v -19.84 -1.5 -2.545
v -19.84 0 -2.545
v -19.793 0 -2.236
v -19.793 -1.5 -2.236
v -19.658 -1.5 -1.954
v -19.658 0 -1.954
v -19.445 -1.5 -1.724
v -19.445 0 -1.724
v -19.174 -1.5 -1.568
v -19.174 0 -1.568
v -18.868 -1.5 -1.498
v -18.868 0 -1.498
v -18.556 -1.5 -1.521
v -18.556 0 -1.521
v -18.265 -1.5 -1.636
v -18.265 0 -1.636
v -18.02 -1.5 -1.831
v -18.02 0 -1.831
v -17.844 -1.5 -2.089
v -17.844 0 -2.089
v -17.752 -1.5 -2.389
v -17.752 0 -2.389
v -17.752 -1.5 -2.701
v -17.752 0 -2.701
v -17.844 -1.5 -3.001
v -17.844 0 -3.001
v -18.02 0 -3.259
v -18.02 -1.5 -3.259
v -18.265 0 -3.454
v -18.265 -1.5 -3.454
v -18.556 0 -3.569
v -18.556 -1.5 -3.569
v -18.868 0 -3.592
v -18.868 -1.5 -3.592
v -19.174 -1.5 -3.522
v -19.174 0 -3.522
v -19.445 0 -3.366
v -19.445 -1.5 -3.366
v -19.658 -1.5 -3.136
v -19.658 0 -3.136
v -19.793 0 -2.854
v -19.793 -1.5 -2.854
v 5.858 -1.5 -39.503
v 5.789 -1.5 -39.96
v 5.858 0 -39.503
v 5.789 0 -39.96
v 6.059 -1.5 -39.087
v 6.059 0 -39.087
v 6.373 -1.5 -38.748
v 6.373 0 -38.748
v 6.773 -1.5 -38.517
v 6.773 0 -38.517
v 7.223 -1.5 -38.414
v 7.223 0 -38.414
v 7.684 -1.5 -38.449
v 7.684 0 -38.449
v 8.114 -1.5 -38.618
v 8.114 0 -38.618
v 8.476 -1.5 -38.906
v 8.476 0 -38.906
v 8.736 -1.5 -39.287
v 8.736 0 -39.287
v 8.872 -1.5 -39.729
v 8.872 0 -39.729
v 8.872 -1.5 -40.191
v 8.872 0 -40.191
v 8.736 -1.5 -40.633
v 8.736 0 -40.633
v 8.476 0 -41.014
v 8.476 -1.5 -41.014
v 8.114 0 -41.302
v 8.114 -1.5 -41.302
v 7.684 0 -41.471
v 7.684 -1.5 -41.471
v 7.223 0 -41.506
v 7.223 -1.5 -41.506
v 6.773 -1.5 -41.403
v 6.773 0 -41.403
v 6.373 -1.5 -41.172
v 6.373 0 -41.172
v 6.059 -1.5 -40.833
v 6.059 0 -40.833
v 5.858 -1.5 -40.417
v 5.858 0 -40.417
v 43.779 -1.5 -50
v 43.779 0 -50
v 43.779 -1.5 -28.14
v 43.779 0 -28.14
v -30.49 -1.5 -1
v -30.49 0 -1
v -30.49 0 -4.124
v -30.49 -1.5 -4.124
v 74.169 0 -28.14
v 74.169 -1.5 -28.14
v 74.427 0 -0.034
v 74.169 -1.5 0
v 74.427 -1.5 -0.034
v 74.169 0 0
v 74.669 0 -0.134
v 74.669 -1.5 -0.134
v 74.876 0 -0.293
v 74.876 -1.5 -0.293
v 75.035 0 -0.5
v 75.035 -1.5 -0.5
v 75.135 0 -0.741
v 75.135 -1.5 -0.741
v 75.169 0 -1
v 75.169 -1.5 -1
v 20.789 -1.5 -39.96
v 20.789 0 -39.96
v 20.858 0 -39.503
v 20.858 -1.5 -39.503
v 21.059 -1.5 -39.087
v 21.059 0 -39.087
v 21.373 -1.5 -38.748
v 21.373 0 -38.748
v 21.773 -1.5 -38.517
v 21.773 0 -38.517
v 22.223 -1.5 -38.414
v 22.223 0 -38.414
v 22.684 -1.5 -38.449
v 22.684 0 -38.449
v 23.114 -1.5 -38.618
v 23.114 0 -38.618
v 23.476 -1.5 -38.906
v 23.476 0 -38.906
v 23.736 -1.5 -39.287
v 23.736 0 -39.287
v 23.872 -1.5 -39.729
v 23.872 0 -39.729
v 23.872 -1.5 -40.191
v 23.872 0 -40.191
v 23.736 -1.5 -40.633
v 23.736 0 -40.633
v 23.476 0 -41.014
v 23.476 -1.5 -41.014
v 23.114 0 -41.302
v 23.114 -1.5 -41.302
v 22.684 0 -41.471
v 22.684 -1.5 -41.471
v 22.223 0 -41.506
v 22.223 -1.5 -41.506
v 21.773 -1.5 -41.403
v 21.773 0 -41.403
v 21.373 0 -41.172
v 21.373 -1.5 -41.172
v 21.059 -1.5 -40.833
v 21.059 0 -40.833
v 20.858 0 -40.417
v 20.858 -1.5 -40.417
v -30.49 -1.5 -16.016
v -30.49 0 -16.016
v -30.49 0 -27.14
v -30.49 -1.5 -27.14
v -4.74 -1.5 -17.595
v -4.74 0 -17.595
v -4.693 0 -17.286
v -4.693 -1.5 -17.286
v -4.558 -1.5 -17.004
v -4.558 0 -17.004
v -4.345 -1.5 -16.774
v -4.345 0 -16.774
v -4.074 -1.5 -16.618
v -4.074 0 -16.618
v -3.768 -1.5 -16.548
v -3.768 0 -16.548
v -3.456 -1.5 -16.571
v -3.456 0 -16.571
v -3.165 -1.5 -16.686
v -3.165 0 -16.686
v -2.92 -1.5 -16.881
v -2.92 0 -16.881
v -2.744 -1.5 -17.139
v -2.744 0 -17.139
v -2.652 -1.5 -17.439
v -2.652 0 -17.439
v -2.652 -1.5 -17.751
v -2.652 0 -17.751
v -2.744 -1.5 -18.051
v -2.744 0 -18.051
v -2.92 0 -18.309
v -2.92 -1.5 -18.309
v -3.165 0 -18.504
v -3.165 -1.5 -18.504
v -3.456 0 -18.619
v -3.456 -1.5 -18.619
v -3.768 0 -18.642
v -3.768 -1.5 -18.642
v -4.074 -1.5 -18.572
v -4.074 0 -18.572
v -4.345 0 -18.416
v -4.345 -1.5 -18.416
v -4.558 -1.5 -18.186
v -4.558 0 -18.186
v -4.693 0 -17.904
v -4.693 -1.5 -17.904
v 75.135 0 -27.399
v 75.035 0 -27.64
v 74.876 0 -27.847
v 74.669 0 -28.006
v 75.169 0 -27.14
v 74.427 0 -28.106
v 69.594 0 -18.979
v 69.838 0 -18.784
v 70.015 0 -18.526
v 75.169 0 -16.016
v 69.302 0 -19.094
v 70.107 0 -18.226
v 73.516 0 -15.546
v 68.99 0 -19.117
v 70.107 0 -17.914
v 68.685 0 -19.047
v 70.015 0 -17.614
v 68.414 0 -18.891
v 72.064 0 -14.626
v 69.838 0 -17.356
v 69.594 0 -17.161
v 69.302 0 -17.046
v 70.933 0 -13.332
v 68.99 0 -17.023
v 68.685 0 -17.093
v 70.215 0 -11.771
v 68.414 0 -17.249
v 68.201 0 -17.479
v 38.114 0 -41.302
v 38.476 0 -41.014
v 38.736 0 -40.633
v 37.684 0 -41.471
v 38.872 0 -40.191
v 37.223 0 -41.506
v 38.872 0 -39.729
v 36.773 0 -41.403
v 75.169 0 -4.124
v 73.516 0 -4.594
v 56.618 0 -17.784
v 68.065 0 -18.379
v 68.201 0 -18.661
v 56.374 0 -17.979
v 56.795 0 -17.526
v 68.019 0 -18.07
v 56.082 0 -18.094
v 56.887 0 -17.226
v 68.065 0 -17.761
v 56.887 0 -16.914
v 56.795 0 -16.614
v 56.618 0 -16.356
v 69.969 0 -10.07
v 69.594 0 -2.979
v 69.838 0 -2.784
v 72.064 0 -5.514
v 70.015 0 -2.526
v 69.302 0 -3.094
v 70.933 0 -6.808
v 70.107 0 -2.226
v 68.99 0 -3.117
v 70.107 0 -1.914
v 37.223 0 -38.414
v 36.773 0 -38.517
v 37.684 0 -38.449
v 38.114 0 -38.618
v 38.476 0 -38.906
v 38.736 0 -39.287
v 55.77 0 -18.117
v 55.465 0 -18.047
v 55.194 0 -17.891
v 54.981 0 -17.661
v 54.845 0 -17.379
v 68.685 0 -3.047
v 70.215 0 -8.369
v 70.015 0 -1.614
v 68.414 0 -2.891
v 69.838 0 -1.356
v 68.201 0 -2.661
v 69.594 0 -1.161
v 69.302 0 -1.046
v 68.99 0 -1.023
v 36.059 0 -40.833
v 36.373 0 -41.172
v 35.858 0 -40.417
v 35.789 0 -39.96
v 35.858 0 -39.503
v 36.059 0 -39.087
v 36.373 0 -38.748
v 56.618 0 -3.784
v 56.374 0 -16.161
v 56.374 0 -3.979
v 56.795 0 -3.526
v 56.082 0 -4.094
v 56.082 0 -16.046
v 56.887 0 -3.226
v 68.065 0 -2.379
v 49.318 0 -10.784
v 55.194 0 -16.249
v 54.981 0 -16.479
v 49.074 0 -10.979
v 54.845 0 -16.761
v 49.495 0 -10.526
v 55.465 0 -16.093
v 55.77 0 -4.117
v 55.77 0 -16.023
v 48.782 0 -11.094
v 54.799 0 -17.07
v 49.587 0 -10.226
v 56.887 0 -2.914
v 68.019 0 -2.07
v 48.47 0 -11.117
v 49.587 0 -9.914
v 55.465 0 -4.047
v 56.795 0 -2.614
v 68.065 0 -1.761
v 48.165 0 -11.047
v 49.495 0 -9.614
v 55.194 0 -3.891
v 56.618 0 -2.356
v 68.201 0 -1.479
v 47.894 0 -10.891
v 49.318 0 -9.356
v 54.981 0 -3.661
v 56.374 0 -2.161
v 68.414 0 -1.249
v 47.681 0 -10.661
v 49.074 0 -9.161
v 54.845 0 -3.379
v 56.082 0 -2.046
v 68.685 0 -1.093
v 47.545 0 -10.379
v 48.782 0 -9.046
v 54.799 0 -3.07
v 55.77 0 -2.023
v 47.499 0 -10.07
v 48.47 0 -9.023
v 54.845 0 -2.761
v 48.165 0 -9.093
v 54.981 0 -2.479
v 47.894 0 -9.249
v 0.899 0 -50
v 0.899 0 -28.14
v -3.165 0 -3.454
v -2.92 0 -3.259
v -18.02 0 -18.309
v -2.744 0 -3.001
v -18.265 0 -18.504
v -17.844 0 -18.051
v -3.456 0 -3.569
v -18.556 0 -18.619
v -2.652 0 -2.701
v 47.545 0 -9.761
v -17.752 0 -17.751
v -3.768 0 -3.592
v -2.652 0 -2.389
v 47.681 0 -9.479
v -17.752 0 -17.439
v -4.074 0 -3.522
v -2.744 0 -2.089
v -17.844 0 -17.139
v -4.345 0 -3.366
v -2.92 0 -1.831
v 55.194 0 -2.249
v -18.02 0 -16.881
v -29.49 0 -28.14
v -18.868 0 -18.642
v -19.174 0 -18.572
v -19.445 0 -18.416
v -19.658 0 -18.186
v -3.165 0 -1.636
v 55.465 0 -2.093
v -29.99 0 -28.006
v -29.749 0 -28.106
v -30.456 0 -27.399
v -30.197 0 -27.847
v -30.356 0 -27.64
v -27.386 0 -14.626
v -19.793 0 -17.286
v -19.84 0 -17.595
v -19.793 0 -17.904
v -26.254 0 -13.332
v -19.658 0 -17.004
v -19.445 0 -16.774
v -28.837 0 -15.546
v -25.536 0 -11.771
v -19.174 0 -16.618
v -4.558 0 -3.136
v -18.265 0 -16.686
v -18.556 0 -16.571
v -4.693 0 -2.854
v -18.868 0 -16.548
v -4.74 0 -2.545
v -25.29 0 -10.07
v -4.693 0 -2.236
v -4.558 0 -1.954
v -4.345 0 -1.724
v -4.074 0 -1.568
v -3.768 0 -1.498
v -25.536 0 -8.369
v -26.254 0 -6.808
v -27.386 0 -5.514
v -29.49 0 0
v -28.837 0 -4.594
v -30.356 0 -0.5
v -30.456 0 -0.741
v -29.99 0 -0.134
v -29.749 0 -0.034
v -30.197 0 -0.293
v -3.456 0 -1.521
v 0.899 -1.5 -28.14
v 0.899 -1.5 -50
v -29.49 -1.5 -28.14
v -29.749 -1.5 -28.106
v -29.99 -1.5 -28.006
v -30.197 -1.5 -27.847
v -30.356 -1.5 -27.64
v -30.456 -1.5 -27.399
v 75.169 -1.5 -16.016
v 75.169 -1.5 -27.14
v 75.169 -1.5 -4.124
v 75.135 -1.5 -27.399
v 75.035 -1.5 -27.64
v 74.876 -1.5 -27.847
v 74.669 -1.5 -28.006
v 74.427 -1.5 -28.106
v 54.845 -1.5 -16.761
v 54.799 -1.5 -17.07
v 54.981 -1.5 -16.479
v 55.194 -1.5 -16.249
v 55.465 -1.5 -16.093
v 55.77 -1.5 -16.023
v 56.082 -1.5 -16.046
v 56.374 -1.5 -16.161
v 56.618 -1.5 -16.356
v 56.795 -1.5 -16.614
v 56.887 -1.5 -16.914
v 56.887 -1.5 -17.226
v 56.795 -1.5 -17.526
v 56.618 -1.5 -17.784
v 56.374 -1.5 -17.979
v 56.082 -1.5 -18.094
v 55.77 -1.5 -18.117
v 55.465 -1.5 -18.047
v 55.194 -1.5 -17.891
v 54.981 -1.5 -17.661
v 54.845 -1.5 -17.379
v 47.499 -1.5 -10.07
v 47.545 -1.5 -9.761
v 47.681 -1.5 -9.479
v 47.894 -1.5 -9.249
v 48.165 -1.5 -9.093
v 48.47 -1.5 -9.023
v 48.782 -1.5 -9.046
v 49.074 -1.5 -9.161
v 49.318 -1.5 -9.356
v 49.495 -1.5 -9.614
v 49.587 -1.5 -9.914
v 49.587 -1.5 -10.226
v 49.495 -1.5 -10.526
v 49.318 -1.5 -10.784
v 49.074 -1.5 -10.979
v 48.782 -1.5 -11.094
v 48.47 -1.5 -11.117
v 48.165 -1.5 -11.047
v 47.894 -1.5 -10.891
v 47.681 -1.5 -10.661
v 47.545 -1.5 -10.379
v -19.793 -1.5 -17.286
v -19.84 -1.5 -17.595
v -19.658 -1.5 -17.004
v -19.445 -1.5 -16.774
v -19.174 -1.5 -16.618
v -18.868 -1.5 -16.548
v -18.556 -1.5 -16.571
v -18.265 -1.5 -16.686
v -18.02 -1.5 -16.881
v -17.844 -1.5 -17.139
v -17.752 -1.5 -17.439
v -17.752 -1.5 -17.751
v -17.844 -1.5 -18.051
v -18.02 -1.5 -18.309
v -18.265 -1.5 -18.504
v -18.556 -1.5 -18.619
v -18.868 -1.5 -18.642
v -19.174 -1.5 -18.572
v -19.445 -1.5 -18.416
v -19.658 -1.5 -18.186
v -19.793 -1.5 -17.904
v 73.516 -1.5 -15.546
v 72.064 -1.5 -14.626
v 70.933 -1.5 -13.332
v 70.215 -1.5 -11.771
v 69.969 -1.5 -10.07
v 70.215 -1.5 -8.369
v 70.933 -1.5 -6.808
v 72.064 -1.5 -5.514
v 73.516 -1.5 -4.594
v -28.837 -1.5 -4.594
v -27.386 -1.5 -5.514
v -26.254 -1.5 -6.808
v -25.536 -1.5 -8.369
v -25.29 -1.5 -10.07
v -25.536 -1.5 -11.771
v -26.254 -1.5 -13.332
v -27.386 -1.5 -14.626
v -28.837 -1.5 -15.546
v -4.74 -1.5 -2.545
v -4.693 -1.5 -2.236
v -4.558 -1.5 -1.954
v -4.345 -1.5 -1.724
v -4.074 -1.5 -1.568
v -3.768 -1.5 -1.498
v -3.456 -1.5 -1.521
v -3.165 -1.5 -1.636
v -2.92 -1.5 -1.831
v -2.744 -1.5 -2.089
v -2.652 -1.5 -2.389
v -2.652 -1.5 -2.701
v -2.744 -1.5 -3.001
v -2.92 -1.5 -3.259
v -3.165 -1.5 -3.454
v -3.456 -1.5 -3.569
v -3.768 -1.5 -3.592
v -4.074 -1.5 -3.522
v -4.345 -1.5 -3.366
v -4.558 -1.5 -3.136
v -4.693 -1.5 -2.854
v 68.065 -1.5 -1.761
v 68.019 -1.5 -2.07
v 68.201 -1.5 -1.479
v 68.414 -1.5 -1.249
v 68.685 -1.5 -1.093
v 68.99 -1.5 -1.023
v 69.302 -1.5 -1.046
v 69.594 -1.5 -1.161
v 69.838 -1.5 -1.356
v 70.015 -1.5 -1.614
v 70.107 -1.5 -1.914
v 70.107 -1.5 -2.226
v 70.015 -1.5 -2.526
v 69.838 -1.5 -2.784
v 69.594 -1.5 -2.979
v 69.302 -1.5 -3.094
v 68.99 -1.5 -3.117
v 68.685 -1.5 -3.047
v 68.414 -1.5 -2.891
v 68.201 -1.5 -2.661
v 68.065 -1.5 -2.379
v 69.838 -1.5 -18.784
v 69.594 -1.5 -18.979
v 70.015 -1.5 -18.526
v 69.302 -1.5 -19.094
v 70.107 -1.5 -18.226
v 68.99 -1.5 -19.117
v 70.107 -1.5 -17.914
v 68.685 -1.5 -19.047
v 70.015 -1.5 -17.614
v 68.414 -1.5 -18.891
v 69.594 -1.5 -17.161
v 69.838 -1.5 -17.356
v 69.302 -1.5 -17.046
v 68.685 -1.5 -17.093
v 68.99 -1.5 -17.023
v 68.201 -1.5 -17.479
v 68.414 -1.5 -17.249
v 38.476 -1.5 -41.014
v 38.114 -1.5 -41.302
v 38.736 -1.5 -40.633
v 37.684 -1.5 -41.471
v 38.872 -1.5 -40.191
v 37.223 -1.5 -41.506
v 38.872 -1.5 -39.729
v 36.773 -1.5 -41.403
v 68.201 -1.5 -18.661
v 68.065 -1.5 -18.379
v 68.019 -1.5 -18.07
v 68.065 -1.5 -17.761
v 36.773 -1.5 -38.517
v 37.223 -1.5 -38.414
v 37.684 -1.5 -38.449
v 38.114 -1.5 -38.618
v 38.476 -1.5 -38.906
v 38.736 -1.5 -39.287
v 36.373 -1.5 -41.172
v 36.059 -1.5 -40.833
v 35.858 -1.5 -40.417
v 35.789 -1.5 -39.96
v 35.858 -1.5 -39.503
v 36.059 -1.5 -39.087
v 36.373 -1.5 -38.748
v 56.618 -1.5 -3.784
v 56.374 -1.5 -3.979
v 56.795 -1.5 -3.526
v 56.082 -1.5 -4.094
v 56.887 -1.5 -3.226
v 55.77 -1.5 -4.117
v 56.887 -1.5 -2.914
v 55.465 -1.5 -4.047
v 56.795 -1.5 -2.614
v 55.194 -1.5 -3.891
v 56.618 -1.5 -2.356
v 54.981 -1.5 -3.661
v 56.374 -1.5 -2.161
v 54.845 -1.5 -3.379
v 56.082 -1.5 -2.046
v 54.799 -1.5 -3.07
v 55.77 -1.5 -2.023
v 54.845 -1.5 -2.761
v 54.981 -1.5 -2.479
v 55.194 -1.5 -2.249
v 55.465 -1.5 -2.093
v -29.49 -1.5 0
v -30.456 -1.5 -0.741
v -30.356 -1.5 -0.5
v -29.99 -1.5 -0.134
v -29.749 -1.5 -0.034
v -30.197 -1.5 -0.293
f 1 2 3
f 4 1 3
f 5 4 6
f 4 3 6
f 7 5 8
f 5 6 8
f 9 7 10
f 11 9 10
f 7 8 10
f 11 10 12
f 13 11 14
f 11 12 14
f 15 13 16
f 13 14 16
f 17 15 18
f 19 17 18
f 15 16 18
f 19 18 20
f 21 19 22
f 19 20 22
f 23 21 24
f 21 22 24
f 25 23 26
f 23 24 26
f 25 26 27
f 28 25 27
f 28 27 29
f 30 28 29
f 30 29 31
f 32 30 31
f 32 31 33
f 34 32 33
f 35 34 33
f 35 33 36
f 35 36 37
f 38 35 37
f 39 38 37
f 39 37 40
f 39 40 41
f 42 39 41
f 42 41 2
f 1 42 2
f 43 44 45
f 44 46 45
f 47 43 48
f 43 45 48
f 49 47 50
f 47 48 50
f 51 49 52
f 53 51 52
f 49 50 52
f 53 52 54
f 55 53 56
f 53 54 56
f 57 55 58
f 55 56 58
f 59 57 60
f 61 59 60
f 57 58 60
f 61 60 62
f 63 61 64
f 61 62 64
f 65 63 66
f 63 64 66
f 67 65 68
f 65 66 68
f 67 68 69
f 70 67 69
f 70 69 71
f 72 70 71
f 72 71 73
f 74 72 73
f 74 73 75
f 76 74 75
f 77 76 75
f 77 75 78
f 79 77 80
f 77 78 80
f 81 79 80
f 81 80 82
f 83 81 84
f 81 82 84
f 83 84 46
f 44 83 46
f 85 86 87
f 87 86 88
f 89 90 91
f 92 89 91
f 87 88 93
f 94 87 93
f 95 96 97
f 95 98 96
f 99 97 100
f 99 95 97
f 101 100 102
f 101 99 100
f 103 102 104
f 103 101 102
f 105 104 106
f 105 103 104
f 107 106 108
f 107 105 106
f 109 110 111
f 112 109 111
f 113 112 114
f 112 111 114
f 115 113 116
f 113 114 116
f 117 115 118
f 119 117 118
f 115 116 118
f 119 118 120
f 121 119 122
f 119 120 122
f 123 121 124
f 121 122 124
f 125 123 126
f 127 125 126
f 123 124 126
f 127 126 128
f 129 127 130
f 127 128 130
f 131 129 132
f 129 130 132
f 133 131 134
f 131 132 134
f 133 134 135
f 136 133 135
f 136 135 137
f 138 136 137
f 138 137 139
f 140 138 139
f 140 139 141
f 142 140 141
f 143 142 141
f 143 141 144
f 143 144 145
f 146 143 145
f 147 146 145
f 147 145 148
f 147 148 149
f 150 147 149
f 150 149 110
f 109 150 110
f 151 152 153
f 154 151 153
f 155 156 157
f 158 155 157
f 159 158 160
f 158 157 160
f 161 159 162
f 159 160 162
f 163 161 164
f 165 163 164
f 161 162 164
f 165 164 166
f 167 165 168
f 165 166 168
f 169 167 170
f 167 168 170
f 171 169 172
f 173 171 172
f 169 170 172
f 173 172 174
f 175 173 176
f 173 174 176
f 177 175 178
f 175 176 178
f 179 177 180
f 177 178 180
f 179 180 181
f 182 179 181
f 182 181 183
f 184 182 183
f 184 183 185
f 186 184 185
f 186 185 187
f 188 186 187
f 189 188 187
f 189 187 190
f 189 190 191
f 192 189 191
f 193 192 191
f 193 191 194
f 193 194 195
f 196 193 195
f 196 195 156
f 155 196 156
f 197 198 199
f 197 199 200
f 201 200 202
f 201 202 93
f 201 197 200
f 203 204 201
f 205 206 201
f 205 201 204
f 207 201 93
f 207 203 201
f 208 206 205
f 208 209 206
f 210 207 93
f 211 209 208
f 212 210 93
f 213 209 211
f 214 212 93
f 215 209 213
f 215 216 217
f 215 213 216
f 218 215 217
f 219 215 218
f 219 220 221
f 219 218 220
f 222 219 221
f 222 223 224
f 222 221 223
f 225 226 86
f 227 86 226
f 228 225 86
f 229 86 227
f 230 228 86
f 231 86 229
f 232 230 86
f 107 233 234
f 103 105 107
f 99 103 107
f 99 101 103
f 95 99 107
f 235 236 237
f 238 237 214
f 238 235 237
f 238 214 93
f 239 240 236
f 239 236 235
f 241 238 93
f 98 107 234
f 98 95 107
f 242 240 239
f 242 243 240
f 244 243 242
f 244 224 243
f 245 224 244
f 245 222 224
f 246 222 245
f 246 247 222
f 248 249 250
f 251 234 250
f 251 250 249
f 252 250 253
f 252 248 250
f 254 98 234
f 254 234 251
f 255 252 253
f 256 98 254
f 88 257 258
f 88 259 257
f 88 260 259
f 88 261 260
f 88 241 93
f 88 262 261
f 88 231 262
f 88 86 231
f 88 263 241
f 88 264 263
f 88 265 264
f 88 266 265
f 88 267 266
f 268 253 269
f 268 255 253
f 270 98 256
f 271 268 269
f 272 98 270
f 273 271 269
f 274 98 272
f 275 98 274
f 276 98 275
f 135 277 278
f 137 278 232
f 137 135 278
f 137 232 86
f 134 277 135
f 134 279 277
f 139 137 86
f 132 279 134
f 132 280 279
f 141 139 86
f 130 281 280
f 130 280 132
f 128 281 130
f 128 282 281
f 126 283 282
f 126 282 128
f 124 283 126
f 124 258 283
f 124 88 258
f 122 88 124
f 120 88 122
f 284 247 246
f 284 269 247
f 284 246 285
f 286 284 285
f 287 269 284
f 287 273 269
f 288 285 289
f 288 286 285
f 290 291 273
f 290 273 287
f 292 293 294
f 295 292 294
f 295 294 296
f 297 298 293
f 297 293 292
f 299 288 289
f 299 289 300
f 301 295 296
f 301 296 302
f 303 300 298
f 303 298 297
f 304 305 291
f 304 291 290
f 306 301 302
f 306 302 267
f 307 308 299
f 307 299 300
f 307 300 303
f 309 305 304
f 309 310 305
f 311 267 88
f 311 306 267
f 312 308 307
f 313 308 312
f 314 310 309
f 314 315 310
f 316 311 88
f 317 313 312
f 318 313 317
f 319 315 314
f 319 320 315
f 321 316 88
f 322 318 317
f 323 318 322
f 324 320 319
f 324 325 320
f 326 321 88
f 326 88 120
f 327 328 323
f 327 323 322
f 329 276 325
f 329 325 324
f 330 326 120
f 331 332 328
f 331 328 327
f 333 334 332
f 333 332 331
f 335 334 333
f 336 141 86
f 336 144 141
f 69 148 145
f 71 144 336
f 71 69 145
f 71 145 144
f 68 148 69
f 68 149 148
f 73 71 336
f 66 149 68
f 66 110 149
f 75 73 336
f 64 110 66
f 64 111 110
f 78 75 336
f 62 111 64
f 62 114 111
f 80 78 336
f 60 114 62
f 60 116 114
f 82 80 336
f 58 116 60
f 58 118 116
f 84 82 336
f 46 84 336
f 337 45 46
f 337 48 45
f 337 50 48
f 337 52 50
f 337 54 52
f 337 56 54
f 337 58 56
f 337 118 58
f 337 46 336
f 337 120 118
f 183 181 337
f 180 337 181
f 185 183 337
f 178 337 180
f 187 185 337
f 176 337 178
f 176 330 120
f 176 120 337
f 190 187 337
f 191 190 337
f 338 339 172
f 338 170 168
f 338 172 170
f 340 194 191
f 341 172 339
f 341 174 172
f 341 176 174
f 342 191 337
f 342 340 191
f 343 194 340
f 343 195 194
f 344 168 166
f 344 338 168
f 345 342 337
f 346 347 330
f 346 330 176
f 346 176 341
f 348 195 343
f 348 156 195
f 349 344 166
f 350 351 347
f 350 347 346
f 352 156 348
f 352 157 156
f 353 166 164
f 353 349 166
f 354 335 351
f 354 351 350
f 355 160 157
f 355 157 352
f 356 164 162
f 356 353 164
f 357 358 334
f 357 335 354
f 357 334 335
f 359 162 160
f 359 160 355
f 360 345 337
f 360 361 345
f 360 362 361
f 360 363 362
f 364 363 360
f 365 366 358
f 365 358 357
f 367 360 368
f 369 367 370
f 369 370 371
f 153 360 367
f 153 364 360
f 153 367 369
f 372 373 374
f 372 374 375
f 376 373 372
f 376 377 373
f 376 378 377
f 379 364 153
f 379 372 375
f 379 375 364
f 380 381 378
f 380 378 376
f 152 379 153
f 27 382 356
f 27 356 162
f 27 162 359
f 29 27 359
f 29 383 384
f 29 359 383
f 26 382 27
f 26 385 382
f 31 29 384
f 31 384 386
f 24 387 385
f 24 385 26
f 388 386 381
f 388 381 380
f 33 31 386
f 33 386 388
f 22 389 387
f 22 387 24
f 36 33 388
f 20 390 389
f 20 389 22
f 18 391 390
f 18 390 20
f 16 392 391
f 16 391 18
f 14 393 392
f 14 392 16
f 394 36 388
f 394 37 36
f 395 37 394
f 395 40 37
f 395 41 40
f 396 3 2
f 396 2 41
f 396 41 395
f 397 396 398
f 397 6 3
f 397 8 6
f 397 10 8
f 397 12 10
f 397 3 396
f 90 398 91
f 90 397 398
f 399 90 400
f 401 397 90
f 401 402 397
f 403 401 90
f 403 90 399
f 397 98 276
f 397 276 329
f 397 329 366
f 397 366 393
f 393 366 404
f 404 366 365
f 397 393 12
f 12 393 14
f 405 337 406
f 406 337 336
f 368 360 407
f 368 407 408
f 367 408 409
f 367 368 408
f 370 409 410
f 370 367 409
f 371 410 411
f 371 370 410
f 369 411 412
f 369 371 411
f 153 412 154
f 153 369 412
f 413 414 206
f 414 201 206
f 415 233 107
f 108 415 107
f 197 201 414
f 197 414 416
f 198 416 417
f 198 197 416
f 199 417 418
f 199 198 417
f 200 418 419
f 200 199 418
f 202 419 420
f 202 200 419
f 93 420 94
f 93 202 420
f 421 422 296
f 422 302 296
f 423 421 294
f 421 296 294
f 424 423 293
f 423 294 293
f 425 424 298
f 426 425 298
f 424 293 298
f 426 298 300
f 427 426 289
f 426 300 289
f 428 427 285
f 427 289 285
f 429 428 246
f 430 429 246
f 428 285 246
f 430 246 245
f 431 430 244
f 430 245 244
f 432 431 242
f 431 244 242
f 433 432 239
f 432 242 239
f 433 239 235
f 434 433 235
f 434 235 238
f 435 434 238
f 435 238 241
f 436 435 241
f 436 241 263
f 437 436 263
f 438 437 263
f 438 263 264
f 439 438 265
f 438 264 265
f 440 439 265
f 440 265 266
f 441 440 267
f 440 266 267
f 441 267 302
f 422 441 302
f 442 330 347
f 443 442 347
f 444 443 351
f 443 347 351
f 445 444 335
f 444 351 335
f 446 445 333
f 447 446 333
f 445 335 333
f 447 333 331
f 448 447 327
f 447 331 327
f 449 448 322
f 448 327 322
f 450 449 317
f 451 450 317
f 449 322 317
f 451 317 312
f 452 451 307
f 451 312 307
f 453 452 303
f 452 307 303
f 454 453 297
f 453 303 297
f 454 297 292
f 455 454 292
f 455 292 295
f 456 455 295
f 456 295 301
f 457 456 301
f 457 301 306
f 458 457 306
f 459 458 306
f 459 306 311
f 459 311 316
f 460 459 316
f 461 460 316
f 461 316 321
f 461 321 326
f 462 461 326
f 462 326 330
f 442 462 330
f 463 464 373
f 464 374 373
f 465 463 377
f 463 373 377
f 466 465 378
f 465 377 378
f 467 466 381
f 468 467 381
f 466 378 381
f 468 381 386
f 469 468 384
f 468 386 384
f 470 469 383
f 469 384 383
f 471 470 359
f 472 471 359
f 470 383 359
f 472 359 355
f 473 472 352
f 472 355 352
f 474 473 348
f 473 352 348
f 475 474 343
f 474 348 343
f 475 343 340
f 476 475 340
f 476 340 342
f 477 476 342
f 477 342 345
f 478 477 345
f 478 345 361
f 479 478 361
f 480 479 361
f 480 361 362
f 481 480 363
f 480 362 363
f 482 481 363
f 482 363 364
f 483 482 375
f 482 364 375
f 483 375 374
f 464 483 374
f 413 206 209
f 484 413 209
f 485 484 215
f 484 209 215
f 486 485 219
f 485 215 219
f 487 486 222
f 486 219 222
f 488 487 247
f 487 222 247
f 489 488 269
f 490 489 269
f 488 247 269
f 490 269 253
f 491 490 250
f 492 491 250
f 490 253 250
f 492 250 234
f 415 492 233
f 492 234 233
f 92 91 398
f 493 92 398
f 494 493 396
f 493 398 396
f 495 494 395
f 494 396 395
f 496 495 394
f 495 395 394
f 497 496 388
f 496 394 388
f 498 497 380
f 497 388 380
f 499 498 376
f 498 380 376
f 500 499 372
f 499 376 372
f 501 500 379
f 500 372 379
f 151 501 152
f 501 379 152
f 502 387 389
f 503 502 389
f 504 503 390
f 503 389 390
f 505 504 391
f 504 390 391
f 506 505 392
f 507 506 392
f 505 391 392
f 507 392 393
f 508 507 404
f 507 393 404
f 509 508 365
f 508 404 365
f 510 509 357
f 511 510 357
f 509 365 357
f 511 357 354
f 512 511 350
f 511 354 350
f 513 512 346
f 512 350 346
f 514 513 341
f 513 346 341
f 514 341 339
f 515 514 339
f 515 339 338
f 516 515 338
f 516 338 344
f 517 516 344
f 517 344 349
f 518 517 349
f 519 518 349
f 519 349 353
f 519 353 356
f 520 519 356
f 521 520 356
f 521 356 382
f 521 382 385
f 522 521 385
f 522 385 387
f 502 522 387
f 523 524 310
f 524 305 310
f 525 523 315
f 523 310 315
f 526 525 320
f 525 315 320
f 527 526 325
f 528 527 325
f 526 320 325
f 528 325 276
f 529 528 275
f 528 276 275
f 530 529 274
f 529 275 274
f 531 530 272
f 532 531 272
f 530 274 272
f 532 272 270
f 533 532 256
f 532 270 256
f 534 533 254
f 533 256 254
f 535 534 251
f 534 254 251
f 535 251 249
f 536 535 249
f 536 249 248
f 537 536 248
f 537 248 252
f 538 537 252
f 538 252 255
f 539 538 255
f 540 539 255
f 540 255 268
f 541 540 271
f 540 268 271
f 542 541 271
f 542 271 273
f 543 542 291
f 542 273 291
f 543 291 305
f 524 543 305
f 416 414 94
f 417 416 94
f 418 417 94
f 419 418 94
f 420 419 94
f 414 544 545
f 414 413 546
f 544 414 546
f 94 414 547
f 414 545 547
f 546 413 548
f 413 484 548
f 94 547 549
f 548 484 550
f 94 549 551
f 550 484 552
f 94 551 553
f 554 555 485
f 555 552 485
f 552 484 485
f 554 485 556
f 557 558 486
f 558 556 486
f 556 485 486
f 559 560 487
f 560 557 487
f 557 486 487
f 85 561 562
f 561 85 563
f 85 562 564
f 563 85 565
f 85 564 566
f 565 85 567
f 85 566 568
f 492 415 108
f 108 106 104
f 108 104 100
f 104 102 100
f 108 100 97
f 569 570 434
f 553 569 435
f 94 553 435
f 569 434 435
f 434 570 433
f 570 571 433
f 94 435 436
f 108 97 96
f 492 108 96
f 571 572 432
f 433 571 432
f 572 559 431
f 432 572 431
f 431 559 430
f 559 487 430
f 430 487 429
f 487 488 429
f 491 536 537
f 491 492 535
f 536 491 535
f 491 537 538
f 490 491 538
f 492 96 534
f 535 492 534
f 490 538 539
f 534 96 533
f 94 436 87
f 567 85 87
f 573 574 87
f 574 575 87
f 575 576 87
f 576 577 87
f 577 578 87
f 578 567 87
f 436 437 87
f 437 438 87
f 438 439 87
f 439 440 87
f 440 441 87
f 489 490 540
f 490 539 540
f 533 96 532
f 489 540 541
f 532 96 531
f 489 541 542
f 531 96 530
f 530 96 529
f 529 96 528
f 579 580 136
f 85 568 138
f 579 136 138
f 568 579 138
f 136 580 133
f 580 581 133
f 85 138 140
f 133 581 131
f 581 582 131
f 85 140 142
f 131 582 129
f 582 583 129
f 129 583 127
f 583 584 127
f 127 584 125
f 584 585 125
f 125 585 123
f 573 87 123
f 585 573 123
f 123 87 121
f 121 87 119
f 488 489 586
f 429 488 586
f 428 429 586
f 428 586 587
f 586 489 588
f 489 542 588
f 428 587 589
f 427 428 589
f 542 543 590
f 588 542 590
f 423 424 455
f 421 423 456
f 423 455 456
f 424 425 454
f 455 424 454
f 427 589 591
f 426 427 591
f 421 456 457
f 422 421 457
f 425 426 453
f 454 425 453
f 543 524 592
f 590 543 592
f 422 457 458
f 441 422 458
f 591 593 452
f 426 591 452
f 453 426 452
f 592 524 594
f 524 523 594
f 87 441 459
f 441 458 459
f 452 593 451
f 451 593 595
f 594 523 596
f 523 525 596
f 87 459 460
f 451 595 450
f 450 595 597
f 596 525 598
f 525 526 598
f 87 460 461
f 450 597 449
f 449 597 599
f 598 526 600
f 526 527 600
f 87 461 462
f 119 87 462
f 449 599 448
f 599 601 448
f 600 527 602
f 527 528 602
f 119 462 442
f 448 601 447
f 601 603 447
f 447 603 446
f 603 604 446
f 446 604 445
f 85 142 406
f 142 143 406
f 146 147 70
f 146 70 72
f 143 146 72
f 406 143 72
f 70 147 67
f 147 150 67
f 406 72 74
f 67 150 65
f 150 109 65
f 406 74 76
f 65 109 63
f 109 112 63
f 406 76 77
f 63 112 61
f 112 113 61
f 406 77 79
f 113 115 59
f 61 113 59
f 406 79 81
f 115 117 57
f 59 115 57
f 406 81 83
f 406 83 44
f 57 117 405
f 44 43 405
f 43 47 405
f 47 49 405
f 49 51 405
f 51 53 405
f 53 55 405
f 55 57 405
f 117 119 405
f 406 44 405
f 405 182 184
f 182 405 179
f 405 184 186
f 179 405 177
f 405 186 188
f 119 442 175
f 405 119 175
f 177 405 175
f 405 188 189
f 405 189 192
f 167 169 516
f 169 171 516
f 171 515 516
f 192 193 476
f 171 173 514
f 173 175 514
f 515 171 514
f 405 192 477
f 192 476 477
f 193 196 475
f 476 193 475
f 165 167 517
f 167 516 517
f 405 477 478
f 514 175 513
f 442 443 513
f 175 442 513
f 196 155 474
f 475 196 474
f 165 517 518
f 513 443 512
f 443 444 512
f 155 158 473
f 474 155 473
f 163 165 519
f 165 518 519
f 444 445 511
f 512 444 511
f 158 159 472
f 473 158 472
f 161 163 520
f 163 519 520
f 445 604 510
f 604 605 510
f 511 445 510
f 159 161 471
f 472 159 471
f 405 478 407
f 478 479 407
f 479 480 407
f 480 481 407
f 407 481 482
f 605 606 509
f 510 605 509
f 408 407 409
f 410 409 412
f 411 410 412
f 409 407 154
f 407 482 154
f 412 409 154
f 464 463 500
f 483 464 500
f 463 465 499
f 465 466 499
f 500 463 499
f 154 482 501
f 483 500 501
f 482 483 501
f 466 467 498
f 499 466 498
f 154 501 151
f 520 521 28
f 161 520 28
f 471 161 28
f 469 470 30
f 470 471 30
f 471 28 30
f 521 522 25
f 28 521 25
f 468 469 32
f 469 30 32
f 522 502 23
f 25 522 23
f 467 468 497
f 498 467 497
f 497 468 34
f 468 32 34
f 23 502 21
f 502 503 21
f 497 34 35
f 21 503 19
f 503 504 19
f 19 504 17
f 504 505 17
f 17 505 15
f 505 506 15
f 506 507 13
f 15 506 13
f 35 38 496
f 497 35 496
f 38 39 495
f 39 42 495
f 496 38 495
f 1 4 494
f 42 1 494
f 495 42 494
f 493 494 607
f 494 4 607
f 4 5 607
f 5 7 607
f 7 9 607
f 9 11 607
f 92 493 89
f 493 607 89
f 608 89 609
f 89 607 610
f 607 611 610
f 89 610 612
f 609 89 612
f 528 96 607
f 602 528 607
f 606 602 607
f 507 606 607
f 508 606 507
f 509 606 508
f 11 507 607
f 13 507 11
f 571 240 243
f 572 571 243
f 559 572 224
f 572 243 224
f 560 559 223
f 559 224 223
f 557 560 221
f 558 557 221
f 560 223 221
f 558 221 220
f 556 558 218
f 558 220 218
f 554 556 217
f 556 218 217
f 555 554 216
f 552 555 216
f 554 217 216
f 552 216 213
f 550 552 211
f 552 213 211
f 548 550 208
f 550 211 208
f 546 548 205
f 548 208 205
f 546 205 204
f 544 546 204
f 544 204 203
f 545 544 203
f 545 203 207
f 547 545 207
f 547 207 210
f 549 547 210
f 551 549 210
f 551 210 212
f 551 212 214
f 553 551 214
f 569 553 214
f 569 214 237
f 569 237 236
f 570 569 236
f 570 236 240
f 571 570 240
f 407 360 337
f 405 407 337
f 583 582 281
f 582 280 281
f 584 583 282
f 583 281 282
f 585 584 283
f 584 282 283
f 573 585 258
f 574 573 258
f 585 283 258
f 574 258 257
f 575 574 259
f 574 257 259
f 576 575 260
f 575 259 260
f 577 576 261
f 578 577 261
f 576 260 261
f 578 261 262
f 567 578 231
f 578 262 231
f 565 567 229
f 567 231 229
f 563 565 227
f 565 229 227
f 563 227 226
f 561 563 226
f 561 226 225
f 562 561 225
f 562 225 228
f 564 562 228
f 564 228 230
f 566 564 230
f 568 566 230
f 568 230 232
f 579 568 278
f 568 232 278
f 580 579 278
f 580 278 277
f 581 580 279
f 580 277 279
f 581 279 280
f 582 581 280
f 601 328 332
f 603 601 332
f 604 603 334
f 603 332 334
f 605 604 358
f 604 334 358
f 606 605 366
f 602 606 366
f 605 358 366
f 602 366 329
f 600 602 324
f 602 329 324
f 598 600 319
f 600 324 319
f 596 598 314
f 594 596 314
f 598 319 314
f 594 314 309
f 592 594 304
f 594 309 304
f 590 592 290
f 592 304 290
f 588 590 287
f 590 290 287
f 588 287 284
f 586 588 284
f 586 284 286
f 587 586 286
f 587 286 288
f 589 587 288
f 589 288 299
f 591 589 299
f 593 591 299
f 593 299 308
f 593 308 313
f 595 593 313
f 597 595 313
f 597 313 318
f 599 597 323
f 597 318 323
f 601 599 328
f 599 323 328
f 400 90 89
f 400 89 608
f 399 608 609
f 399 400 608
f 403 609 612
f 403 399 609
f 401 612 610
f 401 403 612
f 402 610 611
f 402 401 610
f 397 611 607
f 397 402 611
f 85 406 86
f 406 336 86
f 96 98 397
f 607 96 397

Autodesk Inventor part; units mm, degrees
ref_plane "YZ Plane" through (0, 0, 0) normal (1, 0, 0) x (0, 1, 0)
ref_plane "XZ Plane" through (0, 0, 0) normal (0, 1, 0) x (-1, 0, 0)
ref_plane "XY Plane" through (0, 0, 0) normal (0, 0, 1) x (1, 0, 0)
sketch "Sketch1" plane through (0, 0, 0) normal (0, 1, 0) x (-1, 0, 0)
  line L0 (-44.2289, 0) -> (-44.2289, -28.14)
  line L1 (-0.4496, -28.14) -> (-0.4496, 0)
  circle A0 centre (-37.3393, -39.96) radius 1.55
  circle A1 centre (-22.3393, -39.96) radius 1.55
  circle A2 centre (-7.3393, -39.96) radius 1.55
  circle A3 centre (-48.5486, -10.07) radius 1.05
  circle A4 centre (-55.8486, -17.07) radius 1.05
  circle A5 centre (-55.8486, -3.07) radius 1.05
  circle A6 centre (-69.0686, -18.07) radius 1.05
  circle A7 centre (-69.0686, -2.07) radius 1.05
  circle A8 centre (18.79, -17.595) radius 1.05
  circle A9 centre (18.79, -2.545) radius 1.05
  circle A10 centre (3.69, -17.595) radius 1.05
  circle A11 centre (3.69, -2.545) radius 1.05
  arc A12 (30.49, -1) -> (29.49, 0) centre (29.49, -1) ccw
  line L2 (30.49, -1) -> (30.49, -4.1236)
  arc A13 (29.49, -28.14) -> (30.49, -27.14) centre (29.49, -27.14) ccw
  line L3 (29.49, -28.14) -> (-0.8993, -28.14)
  arc A14 (-75.1686, -27.14) -> (-74.1686, -28.14) centre (-74.1686, -27.14) ccw
  line L4 (-75.1686, -27.14) -> (-75.1686, -16.0164)
  line L5 (-43.7793, -28.14) -> (-74.1686, -28.14)
  line L6 (-43.7793, -50) -> (-43.7793, -28.14)
  line L7 (-0.8993, -50) -> (-43.7793, -50)
  line L8 (-0.8993, -28.14) -> (-0.8993, -50)
  line L9 (30.49, -16.0164) -> (30.49, -27.14)
  arc A15 (30.49, -4.1236) -> (30.49, -16.0164) centre (31.29, -10.07) ccw
  line L10 (-74.1686, 0) -> (29.49, 0)
  arc A16 (-74.1686, 0) -> (-75.1686, -1) centre (-74.1686, -1) ccw
  line L11 (-75.1686, -4.1236) -> (-75.1686, -1)
  arc A17 (-75.1686, -16.0164) -> (-75.1686, -4.1236) centre (-75.9686, -10.07) ccw
  line L12 (-44.6786, -28.14) -> (-44.6786, 0)
  line L13 (-43.7793, 0) -> (-43.7793, -28.14)
  line L14 (-0.8993, -28.14) -> (-0.8993, 0)
  line L15 (0, 0) -> (0, -28.14)
extrude "Extrusion1" add sketch "Sketch1" against normal blind 1.5
properties part number "axis_23_top_frame"
